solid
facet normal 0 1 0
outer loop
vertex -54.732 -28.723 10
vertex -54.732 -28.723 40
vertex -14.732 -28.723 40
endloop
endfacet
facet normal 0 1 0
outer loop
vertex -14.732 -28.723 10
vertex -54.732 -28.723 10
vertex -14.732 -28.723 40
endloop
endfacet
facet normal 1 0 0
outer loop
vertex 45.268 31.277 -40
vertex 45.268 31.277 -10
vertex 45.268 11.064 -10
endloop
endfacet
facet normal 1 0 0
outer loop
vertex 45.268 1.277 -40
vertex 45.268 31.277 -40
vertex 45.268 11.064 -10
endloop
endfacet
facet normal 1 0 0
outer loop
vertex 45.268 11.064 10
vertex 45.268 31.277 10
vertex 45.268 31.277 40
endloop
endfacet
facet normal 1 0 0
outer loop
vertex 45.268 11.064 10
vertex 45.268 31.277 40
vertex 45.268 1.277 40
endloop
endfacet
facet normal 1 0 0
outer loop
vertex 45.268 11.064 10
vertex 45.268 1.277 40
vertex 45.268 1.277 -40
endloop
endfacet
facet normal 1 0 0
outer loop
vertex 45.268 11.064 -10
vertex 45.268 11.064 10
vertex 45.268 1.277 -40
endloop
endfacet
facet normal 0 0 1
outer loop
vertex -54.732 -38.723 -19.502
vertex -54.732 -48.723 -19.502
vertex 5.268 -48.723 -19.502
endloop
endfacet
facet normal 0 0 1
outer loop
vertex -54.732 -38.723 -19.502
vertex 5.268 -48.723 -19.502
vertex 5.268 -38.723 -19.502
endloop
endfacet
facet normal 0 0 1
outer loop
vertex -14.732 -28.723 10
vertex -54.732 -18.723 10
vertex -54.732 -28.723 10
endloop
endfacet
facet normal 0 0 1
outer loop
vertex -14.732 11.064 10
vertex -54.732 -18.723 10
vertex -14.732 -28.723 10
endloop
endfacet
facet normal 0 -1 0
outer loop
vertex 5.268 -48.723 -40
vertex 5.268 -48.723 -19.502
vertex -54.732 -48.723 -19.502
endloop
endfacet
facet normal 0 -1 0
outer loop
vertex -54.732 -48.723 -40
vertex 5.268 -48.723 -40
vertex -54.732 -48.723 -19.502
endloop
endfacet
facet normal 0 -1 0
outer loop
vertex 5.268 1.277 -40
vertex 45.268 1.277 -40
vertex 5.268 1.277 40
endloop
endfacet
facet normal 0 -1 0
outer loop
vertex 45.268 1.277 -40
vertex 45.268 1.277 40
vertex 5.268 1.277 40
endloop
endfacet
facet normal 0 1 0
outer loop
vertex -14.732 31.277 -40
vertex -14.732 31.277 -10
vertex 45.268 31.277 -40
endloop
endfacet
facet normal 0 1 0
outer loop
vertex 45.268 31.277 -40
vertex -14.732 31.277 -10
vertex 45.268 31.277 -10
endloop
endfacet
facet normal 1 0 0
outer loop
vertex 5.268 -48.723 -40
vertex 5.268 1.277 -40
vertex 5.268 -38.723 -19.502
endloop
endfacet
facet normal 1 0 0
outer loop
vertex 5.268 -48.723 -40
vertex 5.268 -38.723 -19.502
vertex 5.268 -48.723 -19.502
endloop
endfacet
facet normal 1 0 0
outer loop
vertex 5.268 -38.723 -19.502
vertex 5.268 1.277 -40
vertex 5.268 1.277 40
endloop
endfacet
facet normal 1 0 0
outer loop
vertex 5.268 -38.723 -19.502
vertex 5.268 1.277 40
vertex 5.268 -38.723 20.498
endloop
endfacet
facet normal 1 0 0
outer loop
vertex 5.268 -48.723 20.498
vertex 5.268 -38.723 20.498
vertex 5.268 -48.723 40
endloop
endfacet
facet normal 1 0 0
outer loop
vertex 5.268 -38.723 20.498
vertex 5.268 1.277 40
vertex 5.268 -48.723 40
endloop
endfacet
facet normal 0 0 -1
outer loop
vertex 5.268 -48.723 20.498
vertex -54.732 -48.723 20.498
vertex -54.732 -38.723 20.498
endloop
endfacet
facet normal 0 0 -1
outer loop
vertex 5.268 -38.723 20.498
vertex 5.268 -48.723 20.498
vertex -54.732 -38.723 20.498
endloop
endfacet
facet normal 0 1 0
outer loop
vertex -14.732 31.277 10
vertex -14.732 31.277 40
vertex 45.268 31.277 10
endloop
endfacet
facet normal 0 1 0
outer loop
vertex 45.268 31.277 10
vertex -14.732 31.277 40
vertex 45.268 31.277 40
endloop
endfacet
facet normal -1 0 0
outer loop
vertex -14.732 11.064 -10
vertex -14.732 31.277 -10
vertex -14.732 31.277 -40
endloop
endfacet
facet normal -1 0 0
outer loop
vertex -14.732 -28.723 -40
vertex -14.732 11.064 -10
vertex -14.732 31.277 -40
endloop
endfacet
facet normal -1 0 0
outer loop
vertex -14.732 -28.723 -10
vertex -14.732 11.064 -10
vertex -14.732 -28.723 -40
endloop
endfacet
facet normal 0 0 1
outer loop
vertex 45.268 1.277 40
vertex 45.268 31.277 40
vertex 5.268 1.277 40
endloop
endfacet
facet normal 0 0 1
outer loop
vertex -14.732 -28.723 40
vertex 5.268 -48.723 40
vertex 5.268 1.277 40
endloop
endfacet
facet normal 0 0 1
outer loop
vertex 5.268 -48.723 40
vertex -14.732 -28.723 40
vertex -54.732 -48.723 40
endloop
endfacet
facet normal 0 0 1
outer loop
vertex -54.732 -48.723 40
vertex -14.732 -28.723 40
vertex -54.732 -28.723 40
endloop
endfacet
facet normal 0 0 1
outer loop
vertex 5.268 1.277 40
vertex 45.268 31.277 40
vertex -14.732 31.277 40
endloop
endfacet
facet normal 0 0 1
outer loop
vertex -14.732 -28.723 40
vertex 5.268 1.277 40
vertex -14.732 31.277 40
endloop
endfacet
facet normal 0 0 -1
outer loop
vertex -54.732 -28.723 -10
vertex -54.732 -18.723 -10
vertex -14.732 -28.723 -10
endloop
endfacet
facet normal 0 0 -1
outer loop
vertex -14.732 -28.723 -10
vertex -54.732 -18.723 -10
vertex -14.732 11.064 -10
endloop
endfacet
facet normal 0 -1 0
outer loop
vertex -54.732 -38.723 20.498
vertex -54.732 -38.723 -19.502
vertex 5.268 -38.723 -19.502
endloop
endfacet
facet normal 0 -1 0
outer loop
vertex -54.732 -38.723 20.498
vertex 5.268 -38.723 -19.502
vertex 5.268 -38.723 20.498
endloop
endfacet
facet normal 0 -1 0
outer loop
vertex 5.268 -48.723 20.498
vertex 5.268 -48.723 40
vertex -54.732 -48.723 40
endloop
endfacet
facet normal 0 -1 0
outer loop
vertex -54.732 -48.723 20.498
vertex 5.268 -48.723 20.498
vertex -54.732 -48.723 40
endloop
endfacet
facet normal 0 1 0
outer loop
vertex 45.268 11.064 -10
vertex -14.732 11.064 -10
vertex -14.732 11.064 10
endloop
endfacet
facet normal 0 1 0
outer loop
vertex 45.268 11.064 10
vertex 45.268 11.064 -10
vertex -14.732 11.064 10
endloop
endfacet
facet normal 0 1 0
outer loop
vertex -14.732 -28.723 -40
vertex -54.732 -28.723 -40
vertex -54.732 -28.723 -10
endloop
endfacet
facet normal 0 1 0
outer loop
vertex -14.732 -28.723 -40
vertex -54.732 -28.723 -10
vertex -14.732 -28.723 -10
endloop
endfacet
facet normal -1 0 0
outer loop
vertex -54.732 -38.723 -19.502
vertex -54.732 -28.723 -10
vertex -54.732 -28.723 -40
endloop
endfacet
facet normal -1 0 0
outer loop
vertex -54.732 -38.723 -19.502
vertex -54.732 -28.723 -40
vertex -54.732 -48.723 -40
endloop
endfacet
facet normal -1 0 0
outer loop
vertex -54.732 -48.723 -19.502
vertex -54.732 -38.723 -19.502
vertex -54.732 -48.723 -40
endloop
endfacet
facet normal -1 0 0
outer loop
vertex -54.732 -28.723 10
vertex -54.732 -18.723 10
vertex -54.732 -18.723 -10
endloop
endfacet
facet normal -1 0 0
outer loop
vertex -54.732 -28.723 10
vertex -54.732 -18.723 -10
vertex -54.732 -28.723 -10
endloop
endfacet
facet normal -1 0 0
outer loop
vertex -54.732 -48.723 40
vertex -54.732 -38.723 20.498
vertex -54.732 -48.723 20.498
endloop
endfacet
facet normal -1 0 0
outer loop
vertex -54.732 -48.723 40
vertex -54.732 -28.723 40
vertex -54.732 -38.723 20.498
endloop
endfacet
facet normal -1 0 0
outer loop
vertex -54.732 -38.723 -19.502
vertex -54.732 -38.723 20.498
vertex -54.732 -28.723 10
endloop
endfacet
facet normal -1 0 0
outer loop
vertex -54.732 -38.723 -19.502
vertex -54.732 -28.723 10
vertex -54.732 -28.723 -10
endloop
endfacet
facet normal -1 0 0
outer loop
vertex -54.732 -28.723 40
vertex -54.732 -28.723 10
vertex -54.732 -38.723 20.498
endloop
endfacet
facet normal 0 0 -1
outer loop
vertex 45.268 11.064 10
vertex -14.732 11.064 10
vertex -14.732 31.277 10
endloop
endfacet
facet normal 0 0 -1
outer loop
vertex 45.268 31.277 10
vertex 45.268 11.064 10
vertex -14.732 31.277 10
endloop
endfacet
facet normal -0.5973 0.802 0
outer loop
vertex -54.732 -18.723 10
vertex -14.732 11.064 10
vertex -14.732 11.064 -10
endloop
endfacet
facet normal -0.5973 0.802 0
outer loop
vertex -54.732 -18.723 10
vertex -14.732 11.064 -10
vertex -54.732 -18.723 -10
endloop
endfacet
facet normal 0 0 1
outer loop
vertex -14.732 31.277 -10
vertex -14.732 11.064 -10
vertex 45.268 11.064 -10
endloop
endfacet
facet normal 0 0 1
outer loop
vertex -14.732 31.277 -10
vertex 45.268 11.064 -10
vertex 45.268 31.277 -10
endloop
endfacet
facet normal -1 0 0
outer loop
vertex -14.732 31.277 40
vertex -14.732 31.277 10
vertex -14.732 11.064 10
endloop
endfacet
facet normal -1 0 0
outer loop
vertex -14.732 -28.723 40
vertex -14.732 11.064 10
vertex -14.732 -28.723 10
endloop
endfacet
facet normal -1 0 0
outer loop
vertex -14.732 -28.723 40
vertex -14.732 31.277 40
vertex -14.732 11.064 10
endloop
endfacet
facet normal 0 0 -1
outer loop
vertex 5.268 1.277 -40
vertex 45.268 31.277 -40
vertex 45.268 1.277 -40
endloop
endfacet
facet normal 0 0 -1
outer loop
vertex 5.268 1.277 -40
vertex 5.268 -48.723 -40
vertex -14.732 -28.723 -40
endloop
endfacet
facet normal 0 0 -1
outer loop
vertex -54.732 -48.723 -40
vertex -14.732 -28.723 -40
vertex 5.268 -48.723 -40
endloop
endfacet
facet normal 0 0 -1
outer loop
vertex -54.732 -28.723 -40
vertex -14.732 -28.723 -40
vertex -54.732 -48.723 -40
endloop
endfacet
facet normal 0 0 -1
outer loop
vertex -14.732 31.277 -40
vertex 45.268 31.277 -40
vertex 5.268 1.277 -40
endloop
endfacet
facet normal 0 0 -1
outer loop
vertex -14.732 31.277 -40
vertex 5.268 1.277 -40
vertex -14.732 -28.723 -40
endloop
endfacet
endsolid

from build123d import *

# Parameters (mm, degrees)
BOSS_EXTRUDE1_DEPTH = 40
CUT_EXTRUDE1_DEPTH  = 30
CUT_EXTRUDE2_DEPTH  = 30
CUT_EXTRUDE3_REACH  = 62
SKETCH4_W           = 20
SKETCH4_H           = 20.212765958
CUT_EXTRUDE4_REACH  = 102
SKETCH5_W           = 40
SKETCH5_H           = 10


with BuildPart() as part:
    # Sketch1 → Boss-Extrude1 (new body, symmetric)
    with BuildSketch(Plane.XY):
        Polygon((-14.731740416, -28.723404255), (-14.731740416, 11.063829787), (-14.731740416, 31.276595745), (45.268259584, 31.276595745), (45.268259584, 1.276595745), (5.268259584, 1.276595745), (5.268259584, -48.723404255), (-54.731740416, -48.723404255), (-54.731740416, -28.723404255), align=None)
        Polygon((-54.731740416, -28.723404255), (-14.731740416, -28.723404255), (-14.731740416, 11.063829787), (-54.731740416, -18.723404255), align=None)
    extrude(amount=BOSS_EXTRUDE1_DEPTH, both=True)

    # Sketch2 → Cut-Extrude1 (cut)
    with BuildSketch(Plane.XY.offset(40)):
        Polygon((-54.731740416, -18.723404255), (-54.731740416, -28.723404255), (-14.731740416, -28.723404255), (-14.731740416, 11.063829787), align=None)
    extrude(amount=-CUT_EXTRUDE1_DEPTH, mode=Mode.SUBTRACT)

    # Sketch3 → Cut-Extrude2 (cut)
    with BuildSketch(Plane(origin=(0, 0, -40), x_dir=(-1, 0, 0), z_dir=(0, 0, -1))):
        Polygon((14.731740416, 11.063829787), (54.731740416, -18.723404255), (54.731740416, -28.723404255), (14.731740416, -28.723404255), align=None)
    extrude(amount=-CUT_EXTRUDE2_DEPTH, mode=Mode.SUBTRACT)

    # Sketch4 → Cut-Extrude3 (cut, up to next)
    with BuildSketch(Plane.ZY.offset(14.731740416), mode=Mode.PRIVATE) as cut_extrude3_sk1:
        with Locations((0, 21.170212766)):
            Rectangle(SKETCH4_W, SKETCH4_H)
    cut_extrude3_tool1 = extrude(cut_extrude3_sk1.sketch, amount=-CUT_EXTRUDE3_REACH, mode=Mode.PRIVATE) & part.part
    add(cut_extrude3_tool1.solids().sort_by_distance((-14.73174, 21.170213, 0))[0], mode=Mode.SUBTRACT)

    # Sketch5 → Cut-Extrude4 (cut, up to next)
    with BuildSketch(Plane.ZY.offset(54.731740416), mode=Mode.PRIVATE) as cut_extrude4_sk1:
        with Locations((0.497624841, -43.723404255)):
            Rectangle(SKETCH5_W, SKETCH5_H)
    cut_extrude4_tool1 = extrude(cut_extrude4_sk1.sketch, amount=-CUT_EXTRUDE4_REACH, mode=Mode.PRIVATE) & part.part
    add(cut_extrude4_tool1.solids().sort_by_distance((-54.73174, -43.723404, 0.497625))[0], mode=Mode.SUBTRACT)


solid = part.part
